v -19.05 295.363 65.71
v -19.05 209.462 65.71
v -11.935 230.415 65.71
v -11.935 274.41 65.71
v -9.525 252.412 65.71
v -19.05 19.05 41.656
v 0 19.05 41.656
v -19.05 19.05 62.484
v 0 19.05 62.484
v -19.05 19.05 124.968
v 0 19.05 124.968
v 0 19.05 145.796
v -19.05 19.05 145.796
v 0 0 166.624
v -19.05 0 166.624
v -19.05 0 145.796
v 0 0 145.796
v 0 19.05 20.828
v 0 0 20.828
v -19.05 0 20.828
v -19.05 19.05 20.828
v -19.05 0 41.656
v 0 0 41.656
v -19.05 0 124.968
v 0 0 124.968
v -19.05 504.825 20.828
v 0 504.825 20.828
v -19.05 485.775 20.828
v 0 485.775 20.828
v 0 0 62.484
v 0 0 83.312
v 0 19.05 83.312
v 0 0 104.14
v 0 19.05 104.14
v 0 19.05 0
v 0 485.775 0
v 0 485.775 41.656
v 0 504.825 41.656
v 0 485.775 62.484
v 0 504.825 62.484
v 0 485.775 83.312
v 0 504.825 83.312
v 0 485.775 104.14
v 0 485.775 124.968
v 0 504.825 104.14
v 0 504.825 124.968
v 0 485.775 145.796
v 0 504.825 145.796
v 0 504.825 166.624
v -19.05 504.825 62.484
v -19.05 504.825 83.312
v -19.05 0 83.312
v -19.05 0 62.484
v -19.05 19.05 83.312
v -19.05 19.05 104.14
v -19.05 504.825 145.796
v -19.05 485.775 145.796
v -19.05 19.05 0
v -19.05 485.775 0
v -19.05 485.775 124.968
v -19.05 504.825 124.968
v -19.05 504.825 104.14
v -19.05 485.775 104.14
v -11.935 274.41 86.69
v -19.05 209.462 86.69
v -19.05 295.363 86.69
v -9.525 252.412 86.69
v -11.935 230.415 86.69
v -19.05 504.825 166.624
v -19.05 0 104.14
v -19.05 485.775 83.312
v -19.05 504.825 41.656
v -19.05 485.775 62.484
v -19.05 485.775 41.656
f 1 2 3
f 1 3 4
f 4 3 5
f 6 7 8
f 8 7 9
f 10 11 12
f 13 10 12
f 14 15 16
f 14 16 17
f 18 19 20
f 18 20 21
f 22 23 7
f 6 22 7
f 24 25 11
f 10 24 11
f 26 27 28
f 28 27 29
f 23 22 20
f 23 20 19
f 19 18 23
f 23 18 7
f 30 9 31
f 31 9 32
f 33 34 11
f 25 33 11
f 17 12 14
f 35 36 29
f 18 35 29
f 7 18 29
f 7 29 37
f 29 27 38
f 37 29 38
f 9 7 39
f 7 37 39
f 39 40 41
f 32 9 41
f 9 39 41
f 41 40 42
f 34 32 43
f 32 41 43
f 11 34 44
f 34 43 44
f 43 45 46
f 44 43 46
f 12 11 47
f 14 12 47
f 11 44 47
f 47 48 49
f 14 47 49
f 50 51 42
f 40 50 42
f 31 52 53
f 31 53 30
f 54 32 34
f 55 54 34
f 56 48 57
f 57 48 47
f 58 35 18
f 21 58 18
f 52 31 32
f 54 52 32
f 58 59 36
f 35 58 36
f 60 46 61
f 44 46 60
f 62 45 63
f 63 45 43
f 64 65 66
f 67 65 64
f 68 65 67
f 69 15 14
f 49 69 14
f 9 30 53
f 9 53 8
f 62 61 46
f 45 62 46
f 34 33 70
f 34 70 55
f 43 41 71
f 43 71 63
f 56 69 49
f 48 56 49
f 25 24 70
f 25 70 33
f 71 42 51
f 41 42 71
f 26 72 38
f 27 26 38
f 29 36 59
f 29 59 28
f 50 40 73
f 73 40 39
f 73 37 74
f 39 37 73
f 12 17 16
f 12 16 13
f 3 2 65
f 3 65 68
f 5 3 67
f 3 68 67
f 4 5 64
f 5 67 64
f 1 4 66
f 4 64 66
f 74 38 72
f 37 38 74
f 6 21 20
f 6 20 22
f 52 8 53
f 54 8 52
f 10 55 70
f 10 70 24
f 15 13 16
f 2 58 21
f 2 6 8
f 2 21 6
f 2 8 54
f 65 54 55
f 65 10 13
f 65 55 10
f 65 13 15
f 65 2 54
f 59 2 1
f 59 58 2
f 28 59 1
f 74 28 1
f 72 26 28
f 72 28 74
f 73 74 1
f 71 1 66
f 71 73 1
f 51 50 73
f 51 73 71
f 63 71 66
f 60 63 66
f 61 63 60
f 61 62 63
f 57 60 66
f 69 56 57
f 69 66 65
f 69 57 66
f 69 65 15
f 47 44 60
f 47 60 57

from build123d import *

# Parameters (mm, degrees)
F0_W     = 19.05
F0_H     = 166.624
F1_DEPTH = 252.4125
F3_W     = 19.05
F3_H     = 20.828
F4_DEPTH = 19.051
F7_R     = 101.6
F8_DEPTH = 10.4902


# Not quite as in the source:
# - a length typed as a fraction of an inch, garbled in the dataset ("3 / 203.2 mm" for 3/8 in), is restored


with BuildPart() as f1:
    # F0 (on Front) → F1 (new body)
    with BuildSketch(Plane.XZ):
        with Locations((-9.525, 83.312)):
            Rectangle(F0_W, F0_H)
    extrude(amount=-F1_DEPTH)

    # F3 (on Right) → F4 (cut, through all)
    with BuildSketch(Plane.YZ):
        with Locations((9.525, 135.382)):
            Rectangle(F3_W, F3_H)
        with Locations((9.525, 93.726)):
            Rectangle(F3_W, F3_H)
        with Locations((9.525, 52.07)):
            Rectangle(F3_W, F3_H)
        with Locations((9.525, 10.414)):
            Rectangle(F3_W, F3_H)
    extrude(amount=-F4_DEPTH, mode=Mode.SUBTRACT)

    # F5: F1 across face


with BuildPart() as f1_1:
    add(f1.part)
    add(f1.part.mirror(Plane(origin=(-9.525, 252.4125, 83.312), x_dir=(1, 0, 0), z_dir=(0, 1, 0))))

    # F7 (on offset) → F8 (cut, symmetric)
    with BuildSketch(Plane.XY.offset(76.2)):
        with Locations((-111.125, 252.4125)):
            Circle(F7_R)
    extrude(amount=F8_DEPTH, both=True, mode=Mode.SUBTRACT)


solid = f1_1.part
